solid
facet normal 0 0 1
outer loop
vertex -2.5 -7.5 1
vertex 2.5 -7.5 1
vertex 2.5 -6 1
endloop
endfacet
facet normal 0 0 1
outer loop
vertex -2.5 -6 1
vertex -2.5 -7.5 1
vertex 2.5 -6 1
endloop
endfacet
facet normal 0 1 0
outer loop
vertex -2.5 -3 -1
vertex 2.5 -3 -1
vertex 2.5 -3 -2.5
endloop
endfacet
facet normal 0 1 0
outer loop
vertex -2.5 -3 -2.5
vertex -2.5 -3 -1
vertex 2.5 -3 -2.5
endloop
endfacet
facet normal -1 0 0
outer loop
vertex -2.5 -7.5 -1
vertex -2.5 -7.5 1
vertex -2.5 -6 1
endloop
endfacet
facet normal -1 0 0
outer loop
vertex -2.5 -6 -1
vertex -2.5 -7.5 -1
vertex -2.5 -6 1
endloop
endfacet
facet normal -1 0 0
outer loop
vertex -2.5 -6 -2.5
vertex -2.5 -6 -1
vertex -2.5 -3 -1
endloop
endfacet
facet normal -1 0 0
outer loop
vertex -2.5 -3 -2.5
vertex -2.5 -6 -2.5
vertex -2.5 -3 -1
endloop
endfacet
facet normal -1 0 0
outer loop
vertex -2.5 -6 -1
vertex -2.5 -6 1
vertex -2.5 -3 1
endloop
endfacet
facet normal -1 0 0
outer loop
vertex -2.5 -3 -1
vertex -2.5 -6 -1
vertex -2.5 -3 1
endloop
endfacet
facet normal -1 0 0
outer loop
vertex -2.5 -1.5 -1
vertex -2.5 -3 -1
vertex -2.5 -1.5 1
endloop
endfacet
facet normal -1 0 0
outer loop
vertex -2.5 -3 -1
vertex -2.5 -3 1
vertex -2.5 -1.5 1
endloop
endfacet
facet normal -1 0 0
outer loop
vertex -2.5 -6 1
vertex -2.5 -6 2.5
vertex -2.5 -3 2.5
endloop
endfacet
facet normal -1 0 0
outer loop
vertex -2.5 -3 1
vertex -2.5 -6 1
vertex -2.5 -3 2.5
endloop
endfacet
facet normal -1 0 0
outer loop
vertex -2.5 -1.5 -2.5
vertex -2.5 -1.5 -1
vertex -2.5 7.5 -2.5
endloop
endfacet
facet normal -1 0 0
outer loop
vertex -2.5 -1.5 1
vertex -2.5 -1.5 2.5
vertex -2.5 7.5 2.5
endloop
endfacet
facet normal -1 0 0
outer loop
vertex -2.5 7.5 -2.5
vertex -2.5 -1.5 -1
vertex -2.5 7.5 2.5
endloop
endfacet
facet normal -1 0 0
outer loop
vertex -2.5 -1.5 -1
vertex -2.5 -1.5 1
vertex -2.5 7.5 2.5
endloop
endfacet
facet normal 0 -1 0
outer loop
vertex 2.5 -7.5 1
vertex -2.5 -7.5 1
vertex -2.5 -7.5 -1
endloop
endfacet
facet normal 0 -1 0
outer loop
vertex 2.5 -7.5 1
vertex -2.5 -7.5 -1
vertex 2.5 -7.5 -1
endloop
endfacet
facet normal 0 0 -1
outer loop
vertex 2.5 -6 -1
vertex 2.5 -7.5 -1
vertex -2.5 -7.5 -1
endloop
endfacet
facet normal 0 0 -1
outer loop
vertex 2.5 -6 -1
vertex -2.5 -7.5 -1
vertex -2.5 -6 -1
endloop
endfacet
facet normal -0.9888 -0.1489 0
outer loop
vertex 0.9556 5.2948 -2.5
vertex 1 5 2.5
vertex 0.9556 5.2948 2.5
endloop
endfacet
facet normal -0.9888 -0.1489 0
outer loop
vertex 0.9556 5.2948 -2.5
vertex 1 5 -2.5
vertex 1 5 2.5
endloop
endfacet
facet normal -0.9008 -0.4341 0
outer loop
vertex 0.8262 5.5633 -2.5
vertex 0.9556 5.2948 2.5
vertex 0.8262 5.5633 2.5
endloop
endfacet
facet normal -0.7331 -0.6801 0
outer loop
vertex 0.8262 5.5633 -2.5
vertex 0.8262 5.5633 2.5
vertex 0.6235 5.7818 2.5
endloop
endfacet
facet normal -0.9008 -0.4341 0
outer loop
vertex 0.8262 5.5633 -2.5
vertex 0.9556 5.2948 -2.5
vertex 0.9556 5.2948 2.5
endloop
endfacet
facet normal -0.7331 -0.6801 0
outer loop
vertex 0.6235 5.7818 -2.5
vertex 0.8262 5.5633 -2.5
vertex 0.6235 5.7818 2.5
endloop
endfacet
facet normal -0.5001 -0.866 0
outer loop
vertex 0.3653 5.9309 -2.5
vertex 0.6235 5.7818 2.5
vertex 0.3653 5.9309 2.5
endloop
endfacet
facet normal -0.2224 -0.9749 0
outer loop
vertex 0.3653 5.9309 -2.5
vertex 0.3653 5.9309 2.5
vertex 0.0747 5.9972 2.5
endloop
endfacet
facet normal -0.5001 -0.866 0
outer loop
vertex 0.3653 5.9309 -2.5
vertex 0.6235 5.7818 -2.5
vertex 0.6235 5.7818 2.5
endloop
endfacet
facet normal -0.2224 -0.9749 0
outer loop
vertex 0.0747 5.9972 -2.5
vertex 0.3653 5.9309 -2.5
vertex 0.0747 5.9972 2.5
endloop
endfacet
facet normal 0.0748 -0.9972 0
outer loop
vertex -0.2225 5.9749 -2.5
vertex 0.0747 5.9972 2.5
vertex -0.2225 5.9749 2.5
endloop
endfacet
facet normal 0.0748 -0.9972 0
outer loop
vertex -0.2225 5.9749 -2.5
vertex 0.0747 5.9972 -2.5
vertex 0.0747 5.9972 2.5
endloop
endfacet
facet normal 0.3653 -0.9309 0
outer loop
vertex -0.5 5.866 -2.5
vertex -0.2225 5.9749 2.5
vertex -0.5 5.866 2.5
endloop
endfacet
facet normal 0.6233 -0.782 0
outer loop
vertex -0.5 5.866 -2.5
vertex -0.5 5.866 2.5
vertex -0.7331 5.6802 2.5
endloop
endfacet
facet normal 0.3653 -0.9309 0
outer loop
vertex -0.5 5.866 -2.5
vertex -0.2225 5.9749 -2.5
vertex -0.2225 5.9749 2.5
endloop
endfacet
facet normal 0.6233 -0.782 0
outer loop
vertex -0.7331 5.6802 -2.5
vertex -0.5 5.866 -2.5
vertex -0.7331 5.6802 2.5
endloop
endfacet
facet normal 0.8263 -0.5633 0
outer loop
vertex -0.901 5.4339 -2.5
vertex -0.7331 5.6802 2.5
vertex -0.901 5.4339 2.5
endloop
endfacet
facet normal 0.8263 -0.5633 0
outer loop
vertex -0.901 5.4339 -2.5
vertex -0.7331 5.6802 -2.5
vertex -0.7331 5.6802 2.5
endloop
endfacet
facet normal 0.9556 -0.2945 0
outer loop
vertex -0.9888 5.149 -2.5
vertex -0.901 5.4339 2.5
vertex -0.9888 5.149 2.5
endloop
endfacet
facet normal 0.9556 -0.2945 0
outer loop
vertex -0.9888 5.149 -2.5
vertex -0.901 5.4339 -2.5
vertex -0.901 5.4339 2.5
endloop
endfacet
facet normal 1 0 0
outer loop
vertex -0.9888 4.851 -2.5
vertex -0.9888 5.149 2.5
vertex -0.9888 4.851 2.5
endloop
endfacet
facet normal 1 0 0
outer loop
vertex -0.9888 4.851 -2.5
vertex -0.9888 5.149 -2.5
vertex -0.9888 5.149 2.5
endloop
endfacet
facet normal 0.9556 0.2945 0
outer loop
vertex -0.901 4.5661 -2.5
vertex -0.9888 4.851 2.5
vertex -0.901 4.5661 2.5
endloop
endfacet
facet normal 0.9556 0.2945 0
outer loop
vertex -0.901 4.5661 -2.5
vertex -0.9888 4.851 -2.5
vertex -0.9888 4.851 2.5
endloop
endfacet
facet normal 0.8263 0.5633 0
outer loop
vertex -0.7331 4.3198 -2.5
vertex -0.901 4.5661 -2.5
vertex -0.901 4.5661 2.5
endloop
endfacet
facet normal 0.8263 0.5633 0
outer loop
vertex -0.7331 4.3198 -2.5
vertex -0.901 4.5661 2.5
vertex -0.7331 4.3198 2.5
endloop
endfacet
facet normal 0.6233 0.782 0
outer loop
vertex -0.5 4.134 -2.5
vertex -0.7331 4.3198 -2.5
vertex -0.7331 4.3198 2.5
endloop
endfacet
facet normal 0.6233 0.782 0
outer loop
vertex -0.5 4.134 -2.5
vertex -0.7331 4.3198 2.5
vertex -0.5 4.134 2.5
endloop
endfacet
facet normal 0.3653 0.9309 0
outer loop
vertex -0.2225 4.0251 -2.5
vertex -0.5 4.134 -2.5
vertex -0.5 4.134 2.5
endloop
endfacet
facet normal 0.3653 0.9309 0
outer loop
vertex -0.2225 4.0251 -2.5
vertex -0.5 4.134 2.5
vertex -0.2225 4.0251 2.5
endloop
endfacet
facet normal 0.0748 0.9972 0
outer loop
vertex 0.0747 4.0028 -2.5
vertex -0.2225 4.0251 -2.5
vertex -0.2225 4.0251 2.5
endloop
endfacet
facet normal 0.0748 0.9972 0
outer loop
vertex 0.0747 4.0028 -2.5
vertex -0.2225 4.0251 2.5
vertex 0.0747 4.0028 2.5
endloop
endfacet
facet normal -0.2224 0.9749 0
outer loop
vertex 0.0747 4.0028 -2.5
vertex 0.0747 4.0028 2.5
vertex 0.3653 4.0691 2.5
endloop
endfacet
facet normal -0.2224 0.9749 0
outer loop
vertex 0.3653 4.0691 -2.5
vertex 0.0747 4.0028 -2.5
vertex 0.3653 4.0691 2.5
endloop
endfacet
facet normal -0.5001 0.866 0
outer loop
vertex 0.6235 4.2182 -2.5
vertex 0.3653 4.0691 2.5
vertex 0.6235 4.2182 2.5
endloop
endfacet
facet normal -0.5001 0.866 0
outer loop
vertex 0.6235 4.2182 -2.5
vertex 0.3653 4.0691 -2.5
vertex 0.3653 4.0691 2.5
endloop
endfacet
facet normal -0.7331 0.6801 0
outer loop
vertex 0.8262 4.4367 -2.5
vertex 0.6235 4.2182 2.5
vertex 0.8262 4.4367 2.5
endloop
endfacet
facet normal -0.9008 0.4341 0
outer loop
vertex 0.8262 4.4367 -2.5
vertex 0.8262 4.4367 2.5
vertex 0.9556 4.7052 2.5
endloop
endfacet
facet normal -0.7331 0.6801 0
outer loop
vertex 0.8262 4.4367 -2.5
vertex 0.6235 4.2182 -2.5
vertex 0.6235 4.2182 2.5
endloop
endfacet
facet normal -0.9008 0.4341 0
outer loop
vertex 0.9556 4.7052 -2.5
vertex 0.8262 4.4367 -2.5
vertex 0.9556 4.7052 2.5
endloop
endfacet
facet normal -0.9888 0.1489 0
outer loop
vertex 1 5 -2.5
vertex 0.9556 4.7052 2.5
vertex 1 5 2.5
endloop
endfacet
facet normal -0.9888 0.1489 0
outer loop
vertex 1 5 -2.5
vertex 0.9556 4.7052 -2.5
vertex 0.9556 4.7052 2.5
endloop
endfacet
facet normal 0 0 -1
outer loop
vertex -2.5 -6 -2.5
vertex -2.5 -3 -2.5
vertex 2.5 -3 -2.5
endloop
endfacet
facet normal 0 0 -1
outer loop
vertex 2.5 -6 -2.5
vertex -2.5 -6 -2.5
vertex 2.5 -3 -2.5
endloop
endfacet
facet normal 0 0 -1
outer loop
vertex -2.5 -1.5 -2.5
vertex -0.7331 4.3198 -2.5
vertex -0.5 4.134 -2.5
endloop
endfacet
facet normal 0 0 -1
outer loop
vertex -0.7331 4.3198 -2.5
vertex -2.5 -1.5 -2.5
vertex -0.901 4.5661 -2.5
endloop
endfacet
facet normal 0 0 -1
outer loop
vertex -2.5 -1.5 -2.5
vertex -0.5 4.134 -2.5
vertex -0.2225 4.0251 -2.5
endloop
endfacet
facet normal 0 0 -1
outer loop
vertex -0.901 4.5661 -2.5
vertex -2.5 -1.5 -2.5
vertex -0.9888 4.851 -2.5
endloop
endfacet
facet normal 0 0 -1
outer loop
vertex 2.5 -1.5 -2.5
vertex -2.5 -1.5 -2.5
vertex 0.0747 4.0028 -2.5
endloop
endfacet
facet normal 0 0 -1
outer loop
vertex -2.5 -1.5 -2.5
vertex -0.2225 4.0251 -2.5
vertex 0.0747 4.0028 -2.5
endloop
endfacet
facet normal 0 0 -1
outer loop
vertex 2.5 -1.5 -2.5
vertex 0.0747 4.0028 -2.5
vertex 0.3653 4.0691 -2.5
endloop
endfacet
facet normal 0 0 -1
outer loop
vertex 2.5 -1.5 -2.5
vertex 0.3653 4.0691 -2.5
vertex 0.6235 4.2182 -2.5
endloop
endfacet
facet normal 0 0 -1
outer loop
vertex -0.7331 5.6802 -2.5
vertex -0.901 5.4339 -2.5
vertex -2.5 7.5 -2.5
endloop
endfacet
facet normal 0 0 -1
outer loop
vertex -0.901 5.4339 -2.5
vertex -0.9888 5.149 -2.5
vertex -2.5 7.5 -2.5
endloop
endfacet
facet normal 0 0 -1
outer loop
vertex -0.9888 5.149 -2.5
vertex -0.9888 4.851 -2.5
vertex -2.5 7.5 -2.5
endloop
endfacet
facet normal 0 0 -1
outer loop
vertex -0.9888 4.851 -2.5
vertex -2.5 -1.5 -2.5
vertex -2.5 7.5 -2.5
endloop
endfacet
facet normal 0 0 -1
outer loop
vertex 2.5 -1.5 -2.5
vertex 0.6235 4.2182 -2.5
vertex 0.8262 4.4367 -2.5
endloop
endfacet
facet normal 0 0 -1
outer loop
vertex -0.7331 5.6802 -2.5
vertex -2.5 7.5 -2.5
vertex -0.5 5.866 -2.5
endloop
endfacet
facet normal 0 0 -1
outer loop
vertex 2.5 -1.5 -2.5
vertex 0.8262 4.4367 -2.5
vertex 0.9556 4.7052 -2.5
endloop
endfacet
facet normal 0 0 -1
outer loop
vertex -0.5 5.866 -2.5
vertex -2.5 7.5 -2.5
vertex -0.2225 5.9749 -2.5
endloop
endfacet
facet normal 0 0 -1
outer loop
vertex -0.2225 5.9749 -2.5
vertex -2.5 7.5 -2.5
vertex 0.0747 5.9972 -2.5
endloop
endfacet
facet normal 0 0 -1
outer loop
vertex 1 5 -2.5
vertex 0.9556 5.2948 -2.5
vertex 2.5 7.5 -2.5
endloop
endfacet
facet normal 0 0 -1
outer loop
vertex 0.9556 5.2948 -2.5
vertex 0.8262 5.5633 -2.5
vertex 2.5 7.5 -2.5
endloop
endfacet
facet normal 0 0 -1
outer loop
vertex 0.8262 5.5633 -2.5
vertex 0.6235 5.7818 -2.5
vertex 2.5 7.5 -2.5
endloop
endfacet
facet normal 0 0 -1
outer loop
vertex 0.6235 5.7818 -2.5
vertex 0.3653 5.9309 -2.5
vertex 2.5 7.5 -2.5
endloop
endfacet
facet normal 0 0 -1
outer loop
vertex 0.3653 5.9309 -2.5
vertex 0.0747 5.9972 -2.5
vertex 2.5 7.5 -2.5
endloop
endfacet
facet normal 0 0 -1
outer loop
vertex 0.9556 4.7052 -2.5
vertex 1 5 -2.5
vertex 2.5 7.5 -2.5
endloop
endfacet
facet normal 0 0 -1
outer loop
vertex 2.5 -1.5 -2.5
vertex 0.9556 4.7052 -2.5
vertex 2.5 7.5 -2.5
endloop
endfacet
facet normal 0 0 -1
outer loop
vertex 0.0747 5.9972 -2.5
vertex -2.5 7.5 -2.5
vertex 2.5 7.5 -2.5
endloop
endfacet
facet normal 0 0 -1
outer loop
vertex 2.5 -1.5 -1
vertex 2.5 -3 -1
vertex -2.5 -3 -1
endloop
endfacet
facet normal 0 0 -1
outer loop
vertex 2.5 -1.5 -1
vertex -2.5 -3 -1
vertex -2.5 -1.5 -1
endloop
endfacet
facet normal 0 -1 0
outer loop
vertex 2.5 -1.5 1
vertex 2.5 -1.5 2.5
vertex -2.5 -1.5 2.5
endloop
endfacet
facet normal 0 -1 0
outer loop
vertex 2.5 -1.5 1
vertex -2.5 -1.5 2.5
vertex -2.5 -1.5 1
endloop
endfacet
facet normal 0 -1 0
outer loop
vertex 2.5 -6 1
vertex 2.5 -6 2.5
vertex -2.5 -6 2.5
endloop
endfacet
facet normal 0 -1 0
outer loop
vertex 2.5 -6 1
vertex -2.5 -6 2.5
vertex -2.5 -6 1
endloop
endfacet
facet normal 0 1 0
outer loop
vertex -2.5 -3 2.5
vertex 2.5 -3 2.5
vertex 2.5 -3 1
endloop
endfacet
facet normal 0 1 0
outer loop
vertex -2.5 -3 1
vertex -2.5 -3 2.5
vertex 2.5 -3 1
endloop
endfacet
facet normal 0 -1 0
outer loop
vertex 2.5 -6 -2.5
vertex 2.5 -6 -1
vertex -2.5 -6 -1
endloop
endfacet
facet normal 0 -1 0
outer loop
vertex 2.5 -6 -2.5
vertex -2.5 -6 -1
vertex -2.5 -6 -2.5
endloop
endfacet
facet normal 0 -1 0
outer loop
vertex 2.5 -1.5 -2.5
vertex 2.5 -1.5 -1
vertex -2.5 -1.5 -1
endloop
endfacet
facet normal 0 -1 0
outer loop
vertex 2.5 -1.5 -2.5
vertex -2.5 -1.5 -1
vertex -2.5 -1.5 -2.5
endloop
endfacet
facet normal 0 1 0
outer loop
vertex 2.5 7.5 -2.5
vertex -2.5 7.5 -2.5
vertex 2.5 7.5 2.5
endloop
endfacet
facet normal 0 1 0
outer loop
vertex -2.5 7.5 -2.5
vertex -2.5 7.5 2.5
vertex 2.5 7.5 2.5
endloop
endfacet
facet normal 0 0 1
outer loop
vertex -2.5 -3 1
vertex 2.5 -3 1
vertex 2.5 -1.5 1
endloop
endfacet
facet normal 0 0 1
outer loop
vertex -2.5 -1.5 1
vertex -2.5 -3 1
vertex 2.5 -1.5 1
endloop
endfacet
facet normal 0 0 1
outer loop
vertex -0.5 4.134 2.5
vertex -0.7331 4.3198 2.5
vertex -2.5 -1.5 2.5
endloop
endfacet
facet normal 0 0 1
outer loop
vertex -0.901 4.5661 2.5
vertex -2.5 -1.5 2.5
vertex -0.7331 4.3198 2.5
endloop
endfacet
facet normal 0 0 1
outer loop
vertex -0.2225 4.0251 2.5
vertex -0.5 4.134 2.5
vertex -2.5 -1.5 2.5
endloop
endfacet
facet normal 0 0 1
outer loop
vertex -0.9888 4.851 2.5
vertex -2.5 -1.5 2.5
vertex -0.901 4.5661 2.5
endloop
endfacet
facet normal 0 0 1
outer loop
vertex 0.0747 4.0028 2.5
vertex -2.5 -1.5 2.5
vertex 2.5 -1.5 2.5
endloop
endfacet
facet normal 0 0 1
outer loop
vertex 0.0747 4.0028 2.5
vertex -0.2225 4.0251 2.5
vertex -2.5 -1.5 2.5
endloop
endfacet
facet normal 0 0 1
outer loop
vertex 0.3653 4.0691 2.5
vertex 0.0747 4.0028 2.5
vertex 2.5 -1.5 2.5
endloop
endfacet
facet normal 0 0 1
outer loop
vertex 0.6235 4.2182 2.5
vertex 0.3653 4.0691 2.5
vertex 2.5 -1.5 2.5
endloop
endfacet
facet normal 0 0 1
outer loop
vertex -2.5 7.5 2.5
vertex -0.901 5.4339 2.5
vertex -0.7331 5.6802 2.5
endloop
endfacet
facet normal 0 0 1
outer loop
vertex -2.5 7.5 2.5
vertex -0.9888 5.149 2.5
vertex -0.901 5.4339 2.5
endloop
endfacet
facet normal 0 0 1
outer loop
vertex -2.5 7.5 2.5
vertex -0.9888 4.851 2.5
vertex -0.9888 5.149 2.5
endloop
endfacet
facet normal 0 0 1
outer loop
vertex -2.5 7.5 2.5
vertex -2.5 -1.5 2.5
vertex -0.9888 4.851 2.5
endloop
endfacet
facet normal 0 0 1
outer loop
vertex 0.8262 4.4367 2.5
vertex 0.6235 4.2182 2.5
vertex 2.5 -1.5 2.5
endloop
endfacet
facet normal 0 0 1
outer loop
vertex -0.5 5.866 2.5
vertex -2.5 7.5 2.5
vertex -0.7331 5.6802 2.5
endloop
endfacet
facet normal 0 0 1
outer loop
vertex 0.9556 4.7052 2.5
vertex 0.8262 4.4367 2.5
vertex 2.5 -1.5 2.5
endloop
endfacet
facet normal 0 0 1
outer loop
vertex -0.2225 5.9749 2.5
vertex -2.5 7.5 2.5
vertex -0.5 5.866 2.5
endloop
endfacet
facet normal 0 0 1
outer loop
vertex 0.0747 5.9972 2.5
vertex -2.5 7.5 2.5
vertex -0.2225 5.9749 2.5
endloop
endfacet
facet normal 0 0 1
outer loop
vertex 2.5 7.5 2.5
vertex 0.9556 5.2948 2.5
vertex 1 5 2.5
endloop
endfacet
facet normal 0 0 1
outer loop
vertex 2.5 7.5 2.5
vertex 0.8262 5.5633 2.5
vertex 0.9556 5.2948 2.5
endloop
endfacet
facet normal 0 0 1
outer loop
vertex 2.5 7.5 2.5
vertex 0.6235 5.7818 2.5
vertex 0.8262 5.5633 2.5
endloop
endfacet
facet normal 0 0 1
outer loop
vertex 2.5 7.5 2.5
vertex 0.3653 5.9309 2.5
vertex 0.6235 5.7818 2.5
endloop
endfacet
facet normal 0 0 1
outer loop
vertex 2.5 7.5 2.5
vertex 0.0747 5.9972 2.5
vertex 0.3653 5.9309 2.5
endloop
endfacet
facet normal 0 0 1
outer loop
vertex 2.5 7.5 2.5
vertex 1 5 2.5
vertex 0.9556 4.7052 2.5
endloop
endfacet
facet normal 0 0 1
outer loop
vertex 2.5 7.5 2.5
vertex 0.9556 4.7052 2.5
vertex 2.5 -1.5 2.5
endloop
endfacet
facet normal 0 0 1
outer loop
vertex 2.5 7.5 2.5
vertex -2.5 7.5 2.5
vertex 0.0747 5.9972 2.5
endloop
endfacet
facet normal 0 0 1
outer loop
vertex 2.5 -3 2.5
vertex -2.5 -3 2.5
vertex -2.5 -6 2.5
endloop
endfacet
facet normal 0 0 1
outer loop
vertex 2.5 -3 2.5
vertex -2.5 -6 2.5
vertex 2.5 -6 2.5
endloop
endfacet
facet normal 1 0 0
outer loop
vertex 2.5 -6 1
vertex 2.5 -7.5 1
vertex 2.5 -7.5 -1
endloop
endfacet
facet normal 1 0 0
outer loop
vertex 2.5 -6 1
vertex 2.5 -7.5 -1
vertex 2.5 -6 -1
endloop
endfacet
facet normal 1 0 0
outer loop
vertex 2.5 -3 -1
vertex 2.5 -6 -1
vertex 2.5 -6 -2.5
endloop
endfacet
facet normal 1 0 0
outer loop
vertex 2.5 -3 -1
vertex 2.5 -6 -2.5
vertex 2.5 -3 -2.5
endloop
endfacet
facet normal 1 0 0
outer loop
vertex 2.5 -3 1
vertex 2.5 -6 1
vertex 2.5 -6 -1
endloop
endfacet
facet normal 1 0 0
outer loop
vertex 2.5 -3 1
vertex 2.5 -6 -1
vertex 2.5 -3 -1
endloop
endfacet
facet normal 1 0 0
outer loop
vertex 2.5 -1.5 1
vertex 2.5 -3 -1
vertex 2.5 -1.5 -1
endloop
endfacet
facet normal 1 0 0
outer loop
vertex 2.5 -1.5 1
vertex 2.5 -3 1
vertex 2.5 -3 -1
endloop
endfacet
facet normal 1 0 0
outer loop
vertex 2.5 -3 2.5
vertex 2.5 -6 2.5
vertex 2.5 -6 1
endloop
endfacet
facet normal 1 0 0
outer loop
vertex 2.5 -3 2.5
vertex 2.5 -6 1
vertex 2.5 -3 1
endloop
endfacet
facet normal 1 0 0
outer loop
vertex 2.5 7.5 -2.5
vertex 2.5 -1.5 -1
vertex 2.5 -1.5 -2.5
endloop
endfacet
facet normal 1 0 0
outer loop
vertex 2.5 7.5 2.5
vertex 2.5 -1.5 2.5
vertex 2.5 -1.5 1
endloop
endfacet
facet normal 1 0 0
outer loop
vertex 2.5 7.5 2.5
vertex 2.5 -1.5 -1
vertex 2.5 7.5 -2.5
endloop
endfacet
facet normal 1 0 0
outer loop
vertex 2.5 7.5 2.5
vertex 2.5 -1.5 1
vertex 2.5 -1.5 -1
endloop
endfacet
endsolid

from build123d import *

# Parameters (mm, degrees)
SKETCH2_W           = 5
SKETCH2_H           = 15
SKETCH2_R           = 1
BOSS_EXTRUDE1_DEPTH = 2.5
SKETCH3_W           = 1.5
SKETCH3_H           = 1.5
CUT_EXTRUDE1_DEPTH  = 10.354143467


with BuildPart() as part:
    # Sketch2 → Boss-Extrude1 (new, symmetric)
    with BuildSketch(Plane.XY):
        Rectangle(SKETCH2_W, SKETCH2_H)
        with Locations((0, 5)):
            Circle(SKETCH2_R, mode=Mode.SUBTRACT)
    extrude(amount=BOSS_EXTRUDE1_DEPTH, both=True)

    # Sketch3 → Cut-Extrude1 (cut, through all)
    with BuildSketch(Plane(origin=(2.5, 0, 0), x_dir=(0, 0, -1), z_dir=(1, 0, 0))):
        with Locations((-1.75, -2.25)):
            Rectangle(SKETCH3_W, SKETCH3_H)
        with Locations((-1.75, -6.75)):
            Rectangle(SKETCH3_W, SKETCH3_H)
        with Locations((1.75, -6.75)):
            Rectangle(SKETCH3_W, SKETCH3_H)
        with Locations((1.75, -2.25)):
            Rectangle(SKETCH3_W, SKETCH3_H)
    extrude(amount=-CUT_EXTRUDE1_DEPTH, mode=Mode.SUBTRACT)


solid = part.part
